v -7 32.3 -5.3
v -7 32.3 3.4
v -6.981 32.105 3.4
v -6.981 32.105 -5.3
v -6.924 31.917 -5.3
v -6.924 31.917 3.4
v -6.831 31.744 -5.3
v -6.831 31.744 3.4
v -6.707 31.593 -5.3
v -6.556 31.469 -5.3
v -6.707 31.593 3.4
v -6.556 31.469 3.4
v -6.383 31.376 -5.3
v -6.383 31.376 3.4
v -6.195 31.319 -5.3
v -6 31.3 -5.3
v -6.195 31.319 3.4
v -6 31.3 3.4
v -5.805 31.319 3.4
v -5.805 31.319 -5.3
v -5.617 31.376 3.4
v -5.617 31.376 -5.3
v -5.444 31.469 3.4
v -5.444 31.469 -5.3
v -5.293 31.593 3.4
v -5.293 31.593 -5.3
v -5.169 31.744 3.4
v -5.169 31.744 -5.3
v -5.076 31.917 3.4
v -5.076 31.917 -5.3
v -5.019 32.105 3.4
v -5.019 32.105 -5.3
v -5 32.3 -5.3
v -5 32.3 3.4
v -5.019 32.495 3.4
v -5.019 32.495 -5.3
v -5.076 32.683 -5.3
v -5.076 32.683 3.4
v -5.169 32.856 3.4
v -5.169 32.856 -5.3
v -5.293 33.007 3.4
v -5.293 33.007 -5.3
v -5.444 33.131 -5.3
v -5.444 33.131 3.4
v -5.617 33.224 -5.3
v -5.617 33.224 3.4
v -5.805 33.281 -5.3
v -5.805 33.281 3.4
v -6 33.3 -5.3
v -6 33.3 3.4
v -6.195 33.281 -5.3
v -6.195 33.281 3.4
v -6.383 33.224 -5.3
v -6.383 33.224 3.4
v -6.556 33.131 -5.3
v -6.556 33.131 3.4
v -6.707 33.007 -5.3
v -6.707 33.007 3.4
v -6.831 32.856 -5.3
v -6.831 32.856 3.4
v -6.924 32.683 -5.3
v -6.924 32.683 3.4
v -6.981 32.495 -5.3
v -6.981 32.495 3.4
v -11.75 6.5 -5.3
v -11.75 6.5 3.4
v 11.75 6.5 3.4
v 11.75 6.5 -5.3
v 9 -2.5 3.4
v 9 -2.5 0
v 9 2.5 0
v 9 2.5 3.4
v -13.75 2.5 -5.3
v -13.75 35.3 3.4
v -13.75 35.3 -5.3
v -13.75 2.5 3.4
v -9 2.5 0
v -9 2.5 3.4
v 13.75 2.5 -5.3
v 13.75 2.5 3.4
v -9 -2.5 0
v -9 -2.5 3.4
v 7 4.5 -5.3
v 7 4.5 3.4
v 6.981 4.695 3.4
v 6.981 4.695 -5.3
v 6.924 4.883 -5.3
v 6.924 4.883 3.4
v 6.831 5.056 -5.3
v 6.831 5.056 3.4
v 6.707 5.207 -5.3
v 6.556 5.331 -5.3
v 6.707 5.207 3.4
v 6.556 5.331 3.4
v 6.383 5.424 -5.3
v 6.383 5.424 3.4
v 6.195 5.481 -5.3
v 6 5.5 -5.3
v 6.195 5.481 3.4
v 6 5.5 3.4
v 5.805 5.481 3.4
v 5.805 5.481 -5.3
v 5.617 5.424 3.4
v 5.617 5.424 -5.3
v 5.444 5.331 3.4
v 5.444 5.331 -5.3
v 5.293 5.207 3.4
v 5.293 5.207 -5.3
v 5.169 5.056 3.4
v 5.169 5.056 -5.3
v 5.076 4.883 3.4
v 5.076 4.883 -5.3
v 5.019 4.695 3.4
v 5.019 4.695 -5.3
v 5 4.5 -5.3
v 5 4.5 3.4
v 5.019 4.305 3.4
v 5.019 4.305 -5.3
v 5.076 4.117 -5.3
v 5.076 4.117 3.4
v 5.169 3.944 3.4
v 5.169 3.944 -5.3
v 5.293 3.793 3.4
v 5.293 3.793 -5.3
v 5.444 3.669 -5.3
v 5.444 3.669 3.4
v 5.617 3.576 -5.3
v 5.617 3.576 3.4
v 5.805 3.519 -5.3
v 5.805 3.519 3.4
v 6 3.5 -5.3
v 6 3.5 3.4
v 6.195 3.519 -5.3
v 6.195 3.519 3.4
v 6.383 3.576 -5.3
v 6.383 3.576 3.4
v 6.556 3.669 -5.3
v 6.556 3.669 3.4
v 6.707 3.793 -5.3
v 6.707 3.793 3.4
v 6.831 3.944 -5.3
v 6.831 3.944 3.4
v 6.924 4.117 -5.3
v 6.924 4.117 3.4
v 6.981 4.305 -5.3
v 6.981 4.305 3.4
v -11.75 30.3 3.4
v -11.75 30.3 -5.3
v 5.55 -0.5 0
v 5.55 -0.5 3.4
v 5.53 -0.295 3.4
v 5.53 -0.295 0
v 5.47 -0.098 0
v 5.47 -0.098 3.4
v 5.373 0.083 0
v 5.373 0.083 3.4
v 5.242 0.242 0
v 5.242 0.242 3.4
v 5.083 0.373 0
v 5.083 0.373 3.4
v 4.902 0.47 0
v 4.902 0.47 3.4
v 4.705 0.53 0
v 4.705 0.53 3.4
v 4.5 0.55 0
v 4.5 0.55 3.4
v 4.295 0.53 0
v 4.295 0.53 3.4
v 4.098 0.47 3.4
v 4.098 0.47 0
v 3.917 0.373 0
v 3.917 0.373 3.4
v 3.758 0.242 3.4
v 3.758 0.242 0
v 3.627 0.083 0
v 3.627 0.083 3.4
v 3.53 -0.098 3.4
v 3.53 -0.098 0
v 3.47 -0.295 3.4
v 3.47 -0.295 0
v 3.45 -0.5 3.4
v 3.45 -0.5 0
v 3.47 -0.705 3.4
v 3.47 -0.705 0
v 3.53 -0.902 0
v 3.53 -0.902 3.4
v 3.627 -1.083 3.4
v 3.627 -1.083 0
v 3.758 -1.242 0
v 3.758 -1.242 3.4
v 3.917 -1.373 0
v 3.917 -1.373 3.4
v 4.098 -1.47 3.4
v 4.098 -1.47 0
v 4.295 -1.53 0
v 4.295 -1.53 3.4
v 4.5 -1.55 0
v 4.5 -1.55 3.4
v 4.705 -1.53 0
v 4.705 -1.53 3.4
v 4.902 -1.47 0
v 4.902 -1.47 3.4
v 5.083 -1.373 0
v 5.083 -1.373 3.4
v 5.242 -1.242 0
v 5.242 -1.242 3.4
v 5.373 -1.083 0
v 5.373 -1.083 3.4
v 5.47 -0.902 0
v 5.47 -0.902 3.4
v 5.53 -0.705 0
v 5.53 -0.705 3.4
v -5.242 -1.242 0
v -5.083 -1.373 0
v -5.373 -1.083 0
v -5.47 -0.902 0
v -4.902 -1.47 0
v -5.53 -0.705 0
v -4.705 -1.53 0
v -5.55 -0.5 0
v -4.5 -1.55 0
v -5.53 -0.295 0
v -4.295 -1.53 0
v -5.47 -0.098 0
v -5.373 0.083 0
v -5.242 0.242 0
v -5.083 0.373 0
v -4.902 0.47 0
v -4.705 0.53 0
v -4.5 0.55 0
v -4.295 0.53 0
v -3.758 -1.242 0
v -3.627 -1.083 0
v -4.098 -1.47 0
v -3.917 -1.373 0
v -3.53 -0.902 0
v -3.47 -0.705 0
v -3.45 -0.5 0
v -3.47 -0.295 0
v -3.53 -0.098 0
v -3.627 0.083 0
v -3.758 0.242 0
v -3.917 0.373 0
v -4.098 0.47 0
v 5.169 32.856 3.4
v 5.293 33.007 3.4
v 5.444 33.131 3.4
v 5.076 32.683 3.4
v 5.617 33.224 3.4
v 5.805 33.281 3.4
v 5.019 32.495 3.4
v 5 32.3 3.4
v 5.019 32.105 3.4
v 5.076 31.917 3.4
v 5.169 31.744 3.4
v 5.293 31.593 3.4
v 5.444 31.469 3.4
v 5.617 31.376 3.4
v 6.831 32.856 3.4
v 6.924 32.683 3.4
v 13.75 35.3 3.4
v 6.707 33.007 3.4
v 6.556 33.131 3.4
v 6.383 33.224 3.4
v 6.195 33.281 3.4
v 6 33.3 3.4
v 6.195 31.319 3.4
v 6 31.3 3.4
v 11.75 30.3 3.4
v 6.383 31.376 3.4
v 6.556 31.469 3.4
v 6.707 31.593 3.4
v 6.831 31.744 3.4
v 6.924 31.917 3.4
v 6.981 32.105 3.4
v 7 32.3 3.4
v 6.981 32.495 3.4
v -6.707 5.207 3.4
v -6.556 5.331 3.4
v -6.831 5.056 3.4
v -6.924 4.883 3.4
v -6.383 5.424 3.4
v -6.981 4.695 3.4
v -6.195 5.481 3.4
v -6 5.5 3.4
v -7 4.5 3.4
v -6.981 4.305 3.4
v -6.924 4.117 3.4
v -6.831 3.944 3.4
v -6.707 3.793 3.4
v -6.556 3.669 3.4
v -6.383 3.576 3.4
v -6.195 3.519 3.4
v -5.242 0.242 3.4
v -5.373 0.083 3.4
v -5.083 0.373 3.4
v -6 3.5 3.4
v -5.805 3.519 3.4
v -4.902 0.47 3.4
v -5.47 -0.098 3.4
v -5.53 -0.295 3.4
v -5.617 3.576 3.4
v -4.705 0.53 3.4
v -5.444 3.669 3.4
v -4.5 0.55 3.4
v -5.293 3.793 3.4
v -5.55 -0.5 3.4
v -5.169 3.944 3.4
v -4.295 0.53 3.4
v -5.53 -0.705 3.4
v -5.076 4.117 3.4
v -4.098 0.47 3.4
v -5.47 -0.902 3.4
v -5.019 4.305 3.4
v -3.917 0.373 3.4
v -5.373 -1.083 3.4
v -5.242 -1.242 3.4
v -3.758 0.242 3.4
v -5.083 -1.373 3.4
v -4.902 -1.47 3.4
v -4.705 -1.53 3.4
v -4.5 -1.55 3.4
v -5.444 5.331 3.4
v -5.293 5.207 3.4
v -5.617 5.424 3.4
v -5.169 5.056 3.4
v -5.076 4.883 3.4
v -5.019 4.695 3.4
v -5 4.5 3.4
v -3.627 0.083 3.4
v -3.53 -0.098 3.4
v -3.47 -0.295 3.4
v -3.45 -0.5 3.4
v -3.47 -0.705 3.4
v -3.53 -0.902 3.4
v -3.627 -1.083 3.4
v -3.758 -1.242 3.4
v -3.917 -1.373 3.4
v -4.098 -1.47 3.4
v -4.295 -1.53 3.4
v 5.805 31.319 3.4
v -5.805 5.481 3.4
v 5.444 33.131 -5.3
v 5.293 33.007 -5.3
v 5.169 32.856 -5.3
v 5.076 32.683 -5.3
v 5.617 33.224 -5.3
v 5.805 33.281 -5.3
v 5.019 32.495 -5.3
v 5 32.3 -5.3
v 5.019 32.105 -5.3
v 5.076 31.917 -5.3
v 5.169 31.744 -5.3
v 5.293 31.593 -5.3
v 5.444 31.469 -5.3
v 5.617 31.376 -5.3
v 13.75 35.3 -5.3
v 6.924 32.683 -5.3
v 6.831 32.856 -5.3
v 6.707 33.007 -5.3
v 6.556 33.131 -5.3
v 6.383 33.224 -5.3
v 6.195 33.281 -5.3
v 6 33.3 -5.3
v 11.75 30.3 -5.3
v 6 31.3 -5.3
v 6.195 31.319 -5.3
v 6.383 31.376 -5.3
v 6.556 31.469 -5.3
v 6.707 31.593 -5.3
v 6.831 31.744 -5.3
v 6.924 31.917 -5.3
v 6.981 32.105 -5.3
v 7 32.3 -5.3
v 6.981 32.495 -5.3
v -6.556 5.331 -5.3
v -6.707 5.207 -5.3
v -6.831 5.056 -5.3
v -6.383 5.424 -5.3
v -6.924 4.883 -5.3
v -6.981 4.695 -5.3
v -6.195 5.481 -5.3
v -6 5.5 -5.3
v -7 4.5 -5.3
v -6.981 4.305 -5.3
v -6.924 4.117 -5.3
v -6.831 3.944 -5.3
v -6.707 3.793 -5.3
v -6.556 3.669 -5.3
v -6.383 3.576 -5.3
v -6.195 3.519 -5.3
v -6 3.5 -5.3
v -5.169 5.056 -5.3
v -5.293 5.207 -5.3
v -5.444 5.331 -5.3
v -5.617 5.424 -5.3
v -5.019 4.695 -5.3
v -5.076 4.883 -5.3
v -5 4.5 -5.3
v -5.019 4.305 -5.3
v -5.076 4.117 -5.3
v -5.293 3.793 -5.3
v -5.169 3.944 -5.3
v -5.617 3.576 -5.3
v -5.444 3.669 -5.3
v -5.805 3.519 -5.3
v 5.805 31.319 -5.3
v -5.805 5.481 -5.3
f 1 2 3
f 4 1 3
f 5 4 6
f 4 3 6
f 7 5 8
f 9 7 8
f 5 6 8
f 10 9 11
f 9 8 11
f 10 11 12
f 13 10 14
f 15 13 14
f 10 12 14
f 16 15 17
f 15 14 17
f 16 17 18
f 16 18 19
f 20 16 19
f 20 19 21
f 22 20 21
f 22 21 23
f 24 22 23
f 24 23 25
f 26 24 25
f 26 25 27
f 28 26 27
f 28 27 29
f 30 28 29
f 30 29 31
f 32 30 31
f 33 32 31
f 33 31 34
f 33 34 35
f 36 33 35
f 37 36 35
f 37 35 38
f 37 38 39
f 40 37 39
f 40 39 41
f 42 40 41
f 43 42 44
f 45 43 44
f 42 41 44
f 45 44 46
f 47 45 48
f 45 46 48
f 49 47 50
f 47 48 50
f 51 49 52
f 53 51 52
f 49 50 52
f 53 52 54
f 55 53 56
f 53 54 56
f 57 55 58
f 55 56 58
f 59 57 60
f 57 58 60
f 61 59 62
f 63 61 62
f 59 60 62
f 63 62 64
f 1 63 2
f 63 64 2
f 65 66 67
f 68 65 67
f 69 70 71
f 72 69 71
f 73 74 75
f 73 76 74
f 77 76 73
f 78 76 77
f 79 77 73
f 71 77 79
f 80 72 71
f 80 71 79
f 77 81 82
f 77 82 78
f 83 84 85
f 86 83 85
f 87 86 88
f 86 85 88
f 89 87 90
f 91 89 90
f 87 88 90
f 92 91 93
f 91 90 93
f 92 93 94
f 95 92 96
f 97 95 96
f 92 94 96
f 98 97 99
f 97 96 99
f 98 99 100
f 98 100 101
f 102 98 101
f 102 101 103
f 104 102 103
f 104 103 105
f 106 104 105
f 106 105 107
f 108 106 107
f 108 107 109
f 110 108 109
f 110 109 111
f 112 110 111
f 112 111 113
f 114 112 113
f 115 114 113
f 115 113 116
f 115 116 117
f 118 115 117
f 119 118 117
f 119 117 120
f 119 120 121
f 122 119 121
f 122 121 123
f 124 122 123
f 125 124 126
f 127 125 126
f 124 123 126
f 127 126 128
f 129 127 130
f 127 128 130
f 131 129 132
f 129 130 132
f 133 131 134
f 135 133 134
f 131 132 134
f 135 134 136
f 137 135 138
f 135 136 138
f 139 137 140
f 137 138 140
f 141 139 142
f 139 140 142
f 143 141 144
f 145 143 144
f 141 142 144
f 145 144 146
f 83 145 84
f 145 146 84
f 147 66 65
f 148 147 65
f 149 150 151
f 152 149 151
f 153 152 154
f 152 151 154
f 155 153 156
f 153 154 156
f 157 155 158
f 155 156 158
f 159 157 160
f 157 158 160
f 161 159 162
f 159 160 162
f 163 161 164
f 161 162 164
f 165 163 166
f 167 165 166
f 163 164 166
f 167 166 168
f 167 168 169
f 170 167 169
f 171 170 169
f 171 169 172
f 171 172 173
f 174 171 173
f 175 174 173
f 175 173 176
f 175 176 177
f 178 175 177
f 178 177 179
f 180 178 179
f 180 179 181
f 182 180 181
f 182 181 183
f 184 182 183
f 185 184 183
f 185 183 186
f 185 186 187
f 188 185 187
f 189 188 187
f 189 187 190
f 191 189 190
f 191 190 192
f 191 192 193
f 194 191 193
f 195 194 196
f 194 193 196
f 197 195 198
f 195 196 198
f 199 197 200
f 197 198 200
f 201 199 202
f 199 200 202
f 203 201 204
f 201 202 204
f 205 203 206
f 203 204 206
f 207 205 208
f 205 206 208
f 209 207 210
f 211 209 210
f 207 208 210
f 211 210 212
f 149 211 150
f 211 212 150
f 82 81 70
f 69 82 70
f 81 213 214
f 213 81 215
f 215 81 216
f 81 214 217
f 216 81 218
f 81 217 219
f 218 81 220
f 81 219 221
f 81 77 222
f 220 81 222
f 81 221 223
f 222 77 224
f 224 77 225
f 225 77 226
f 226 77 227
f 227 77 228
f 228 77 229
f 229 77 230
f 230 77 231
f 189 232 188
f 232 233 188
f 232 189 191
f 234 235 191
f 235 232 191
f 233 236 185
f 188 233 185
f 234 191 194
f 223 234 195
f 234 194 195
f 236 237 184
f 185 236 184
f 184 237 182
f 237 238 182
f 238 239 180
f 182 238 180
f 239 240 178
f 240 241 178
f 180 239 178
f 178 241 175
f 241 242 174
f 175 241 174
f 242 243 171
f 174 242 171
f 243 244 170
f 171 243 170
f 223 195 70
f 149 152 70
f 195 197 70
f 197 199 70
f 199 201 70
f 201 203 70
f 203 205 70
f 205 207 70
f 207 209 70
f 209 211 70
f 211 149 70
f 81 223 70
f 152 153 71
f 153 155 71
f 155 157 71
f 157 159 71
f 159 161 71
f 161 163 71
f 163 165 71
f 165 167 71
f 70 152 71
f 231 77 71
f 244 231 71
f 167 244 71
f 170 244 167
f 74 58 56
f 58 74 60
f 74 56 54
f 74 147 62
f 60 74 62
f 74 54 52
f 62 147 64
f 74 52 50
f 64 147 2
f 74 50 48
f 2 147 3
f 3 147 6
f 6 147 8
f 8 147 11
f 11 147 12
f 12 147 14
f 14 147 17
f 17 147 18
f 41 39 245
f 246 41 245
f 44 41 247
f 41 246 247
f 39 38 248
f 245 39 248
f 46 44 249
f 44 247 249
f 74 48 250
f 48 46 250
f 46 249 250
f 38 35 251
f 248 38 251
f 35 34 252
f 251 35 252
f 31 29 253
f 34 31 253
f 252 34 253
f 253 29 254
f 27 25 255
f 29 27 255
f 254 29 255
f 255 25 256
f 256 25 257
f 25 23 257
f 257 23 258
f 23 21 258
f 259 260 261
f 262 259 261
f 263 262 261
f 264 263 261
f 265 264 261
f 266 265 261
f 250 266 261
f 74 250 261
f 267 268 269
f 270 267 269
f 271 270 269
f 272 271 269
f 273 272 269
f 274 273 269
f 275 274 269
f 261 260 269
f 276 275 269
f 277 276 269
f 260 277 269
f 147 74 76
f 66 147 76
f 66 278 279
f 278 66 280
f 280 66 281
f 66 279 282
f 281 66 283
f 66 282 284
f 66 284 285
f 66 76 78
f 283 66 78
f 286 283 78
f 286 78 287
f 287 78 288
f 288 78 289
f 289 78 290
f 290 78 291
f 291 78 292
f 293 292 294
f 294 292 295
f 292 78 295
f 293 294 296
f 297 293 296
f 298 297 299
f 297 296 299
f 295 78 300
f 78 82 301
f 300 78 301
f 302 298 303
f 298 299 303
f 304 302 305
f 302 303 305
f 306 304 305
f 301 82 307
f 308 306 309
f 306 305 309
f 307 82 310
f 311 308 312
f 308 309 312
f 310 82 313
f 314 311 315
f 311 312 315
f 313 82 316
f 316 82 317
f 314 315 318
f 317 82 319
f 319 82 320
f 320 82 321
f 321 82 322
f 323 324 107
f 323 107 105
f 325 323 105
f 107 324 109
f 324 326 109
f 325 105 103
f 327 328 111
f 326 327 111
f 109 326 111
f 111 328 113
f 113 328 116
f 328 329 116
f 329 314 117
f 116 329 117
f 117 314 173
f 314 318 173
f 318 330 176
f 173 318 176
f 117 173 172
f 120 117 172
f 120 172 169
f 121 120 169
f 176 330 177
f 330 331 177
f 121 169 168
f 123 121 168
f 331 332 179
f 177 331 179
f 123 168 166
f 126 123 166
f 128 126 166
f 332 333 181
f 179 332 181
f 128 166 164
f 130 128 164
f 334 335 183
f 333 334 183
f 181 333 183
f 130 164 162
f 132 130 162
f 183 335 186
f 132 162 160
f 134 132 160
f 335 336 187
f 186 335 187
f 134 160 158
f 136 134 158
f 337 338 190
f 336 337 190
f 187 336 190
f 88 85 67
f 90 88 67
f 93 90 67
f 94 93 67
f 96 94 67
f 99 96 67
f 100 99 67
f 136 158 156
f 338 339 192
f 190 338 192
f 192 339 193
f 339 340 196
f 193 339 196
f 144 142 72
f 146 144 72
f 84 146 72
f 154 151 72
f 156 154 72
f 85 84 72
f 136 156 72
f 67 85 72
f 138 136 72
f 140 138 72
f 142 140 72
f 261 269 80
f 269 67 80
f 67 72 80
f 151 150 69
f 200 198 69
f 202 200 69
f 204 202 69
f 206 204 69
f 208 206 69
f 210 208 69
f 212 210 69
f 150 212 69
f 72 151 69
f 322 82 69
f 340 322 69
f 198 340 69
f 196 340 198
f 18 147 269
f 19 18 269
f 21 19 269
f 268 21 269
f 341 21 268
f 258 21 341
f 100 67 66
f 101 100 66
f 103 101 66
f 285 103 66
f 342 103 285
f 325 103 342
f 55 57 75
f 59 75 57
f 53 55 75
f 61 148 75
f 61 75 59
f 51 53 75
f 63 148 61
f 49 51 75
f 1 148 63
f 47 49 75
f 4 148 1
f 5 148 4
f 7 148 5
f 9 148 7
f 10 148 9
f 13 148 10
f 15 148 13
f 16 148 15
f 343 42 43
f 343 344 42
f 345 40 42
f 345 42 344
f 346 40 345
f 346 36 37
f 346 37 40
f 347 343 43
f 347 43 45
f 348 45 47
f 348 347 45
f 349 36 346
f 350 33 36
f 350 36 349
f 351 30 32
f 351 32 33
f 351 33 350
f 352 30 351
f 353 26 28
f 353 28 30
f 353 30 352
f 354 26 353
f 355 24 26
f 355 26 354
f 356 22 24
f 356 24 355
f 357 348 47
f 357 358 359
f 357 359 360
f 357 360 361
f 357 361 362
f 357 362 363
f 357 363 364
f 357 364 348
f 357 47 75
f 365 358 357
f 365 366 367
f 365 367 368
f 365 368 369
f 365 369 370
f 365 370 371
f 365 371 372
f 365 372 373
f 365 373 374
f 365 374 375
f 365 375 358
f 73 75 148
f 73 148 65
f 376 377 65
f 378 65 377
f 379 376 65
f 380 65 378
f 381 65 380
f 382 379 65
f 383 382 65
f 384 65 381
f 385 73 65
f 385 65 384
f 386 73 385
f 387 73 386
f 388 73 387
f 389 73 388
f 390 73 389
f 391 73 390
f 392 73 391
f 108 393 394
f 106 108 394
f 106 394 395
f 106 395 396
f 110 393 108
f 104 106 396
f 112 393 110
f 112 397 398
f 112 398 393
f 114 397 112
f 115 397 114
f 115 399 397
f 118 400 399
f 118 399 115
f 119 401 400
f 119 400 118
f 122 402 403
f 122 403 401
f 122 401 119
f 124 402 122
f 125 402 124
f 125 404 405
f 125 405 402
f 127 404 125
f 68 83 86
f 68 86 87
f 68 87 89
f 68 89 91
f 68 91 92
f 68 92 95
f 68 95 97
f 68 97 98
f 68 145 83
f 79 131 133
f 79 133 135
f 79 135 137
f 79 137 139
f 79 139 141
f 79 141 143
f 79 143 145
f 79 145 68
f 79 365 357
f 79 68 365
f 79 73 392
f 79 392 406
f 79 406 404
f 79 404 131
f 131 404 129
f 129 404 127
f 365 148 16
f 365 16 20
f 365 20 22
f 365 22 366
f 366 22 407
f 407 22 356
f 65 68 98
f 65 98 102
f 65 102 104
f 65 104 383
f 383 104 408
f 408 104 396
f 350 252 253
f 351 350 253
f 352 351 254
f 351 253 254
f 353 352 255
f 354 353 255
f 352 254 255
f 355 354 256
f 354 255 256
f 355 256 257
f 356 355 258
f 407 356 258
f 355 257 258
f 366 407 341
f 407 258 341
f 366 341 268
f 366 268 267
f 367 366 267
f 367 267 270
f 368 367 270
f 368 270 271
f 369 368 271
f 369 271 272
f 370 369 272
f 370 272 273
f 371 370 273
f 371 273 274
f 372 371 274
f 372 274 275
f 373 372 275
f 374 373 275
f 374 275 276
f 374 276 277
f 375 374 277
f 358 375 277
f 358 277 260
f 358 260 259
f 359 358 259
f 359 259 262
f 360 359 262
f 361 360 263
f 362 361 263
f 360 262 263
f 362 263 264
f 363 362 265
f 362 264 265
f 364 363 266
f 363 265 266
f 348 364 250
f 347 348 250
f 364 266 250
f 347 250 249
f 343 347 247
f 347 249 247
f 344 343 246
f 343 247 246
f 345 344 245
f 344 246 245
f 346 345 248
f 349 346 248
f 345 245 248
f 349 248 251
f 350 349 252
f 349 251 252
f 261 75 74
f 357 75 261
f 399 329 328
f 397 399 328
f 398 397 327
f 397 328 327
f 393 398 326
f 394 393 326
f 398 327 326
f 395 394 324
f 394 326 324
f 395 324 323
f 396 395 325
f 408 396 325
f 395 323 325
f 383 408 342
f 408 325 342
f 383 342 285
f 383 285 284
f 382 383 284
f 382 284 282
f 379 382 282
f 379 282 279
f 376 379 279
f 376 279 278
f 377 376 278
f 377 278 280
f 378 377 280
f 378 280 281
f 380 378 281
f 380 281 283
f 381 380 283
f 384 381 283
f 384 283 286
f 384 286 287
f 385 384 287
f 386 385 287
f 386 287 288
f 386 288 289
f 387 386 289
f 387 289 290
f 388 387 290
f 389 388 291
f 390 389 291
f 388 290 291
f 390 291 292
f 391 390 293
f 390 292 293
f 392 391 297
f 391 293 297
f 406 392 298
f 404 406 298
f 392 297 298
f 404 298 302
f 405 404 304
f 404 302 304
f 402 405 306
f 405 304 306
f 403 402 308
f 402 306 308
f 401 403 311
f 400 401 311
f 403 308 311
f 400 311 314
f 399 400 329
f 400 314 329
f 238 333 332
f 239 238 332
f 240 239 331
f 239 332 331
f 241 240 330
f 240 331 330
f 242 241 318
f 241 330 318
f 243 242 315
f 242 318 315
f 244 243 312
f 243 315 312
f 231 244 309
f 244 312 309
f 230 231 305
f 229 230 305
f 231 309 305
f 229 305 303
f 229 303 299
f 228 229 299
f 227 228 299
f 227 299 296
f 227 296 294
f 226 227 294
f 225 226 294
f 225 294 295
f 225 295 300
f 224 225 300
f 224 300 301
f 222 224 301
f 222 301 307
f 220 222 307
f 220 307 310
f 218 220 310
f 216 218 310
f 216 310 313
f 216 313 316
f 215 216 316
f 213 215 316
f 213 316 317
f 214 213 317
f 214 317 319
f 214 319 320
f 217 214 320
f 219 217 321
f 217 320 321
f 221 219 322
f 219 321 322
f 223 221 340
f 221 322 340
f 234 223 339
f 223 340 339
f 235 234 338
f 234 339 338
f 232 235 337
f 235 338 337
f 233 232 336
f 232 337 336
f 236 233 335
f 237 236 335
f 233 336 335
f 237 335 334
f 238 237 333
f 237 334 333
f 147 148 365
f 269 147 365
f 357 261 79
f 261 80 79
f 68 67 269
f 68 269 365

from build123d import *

# Parameters (mm, degrees)
SKETCH1_W           = 18
SKETCH1_H           = 5
BOSS_EXTRUDE1_DEPTH = 3.4
SKETCH2_W           = 27.5
SKETCH2_H           = 4
BOSS_EXTRUDE2_DEPTH = 8.7
SKETCH3_W           = 2
SKETCH3_H           = 8.7
BOSS_EXTRUDE3_DEPTH = 23.8
SKETCH4_W           = 27.5
SKETCH4_H           = 8.7
BOSS_EXTRUDE4_DEPTH = 5
SKETCH5_R           = 1.05
SKETCH5_R_2         = 1
CUT_EXTRUDE1_DEPTH  = 39.869557497


with BuildPart() as part:
    # Sketch1 → Boss-Extrude1 (new body)
    with BuildSketch(Plane.XY):
        Rectangle(SKETCH1_W, SKETCH1_H)
    extrude(amount=BOSS_EXTRUDE1_DEPTH)

    # Sketch2 → Boss-Extrude2 (add)
    with BuildSketch(Plane.XY.offset(3.4)):
        with Locations((0, 4.5)):
            Rectangle(SKETCH2_W, SKETCH2_H)
    extrude(amount=-BOSS_EXTRUDE2_DEPTH)

    # Sketch3 → Boss-Extrude3 (add)
    with BuildSketch(Plane(origin=(0, 6.5, 0), x_dir=(1, 0, 0), z_dir=(0, 1, 0))):
        with Locations((-12.75, 0.95)):
            Rectangle(SKETCH3_W, SKETCH3_H)
        with Locations((12.75, 0.95)):
            Rectangle(SKETCH3_W, SKETCH3_H)
    extrude(amount=BOSS_EXTRUDE3_DEPTH)

    # Sketch4 → Boss-Extrude4 (add)
    with BuildSketch(Plane(origin=(0, 30.3, 0), x_dir=(1, 0, 0), z_dir=(0, 1, 0))):
        with Locations((0, 0.95)):
            Rectangle(SKETCH4_W, SKETCH4_H)
    extrude(amount=BOSS_EXTRUDE4_DEPTH)

    # Sketch5 → Cut-Extrude1 (cut, through all)
    with BuildSketch(Plane.XY.offset(3.4)):
        with Locations((-4.5, -0.5)):
            Circle(SKETCH5_R)
        with Locations((4.5, -0.5)):
            Circle(SKETCH5_R)
        with Locations((-6, 4.5)):
            Circle(SKETCH5_R_2)
        with Locations((6, 4.5)):
            Circle(SKETCH5_R_2)
        with Locations(Location((6, 32.3, 0), (0, 0, 180))):
            Circle(SKETCH5_R_2)
        with Locations(Location((-6, 32.3, 0), (0, 0, 180))):
            Circle(SKETCH5_R_2)
    extrude(amount=-CUT_EXTRUDE1_DEPTH, mode=Mode.SUBTRACT)


solid = part.part
